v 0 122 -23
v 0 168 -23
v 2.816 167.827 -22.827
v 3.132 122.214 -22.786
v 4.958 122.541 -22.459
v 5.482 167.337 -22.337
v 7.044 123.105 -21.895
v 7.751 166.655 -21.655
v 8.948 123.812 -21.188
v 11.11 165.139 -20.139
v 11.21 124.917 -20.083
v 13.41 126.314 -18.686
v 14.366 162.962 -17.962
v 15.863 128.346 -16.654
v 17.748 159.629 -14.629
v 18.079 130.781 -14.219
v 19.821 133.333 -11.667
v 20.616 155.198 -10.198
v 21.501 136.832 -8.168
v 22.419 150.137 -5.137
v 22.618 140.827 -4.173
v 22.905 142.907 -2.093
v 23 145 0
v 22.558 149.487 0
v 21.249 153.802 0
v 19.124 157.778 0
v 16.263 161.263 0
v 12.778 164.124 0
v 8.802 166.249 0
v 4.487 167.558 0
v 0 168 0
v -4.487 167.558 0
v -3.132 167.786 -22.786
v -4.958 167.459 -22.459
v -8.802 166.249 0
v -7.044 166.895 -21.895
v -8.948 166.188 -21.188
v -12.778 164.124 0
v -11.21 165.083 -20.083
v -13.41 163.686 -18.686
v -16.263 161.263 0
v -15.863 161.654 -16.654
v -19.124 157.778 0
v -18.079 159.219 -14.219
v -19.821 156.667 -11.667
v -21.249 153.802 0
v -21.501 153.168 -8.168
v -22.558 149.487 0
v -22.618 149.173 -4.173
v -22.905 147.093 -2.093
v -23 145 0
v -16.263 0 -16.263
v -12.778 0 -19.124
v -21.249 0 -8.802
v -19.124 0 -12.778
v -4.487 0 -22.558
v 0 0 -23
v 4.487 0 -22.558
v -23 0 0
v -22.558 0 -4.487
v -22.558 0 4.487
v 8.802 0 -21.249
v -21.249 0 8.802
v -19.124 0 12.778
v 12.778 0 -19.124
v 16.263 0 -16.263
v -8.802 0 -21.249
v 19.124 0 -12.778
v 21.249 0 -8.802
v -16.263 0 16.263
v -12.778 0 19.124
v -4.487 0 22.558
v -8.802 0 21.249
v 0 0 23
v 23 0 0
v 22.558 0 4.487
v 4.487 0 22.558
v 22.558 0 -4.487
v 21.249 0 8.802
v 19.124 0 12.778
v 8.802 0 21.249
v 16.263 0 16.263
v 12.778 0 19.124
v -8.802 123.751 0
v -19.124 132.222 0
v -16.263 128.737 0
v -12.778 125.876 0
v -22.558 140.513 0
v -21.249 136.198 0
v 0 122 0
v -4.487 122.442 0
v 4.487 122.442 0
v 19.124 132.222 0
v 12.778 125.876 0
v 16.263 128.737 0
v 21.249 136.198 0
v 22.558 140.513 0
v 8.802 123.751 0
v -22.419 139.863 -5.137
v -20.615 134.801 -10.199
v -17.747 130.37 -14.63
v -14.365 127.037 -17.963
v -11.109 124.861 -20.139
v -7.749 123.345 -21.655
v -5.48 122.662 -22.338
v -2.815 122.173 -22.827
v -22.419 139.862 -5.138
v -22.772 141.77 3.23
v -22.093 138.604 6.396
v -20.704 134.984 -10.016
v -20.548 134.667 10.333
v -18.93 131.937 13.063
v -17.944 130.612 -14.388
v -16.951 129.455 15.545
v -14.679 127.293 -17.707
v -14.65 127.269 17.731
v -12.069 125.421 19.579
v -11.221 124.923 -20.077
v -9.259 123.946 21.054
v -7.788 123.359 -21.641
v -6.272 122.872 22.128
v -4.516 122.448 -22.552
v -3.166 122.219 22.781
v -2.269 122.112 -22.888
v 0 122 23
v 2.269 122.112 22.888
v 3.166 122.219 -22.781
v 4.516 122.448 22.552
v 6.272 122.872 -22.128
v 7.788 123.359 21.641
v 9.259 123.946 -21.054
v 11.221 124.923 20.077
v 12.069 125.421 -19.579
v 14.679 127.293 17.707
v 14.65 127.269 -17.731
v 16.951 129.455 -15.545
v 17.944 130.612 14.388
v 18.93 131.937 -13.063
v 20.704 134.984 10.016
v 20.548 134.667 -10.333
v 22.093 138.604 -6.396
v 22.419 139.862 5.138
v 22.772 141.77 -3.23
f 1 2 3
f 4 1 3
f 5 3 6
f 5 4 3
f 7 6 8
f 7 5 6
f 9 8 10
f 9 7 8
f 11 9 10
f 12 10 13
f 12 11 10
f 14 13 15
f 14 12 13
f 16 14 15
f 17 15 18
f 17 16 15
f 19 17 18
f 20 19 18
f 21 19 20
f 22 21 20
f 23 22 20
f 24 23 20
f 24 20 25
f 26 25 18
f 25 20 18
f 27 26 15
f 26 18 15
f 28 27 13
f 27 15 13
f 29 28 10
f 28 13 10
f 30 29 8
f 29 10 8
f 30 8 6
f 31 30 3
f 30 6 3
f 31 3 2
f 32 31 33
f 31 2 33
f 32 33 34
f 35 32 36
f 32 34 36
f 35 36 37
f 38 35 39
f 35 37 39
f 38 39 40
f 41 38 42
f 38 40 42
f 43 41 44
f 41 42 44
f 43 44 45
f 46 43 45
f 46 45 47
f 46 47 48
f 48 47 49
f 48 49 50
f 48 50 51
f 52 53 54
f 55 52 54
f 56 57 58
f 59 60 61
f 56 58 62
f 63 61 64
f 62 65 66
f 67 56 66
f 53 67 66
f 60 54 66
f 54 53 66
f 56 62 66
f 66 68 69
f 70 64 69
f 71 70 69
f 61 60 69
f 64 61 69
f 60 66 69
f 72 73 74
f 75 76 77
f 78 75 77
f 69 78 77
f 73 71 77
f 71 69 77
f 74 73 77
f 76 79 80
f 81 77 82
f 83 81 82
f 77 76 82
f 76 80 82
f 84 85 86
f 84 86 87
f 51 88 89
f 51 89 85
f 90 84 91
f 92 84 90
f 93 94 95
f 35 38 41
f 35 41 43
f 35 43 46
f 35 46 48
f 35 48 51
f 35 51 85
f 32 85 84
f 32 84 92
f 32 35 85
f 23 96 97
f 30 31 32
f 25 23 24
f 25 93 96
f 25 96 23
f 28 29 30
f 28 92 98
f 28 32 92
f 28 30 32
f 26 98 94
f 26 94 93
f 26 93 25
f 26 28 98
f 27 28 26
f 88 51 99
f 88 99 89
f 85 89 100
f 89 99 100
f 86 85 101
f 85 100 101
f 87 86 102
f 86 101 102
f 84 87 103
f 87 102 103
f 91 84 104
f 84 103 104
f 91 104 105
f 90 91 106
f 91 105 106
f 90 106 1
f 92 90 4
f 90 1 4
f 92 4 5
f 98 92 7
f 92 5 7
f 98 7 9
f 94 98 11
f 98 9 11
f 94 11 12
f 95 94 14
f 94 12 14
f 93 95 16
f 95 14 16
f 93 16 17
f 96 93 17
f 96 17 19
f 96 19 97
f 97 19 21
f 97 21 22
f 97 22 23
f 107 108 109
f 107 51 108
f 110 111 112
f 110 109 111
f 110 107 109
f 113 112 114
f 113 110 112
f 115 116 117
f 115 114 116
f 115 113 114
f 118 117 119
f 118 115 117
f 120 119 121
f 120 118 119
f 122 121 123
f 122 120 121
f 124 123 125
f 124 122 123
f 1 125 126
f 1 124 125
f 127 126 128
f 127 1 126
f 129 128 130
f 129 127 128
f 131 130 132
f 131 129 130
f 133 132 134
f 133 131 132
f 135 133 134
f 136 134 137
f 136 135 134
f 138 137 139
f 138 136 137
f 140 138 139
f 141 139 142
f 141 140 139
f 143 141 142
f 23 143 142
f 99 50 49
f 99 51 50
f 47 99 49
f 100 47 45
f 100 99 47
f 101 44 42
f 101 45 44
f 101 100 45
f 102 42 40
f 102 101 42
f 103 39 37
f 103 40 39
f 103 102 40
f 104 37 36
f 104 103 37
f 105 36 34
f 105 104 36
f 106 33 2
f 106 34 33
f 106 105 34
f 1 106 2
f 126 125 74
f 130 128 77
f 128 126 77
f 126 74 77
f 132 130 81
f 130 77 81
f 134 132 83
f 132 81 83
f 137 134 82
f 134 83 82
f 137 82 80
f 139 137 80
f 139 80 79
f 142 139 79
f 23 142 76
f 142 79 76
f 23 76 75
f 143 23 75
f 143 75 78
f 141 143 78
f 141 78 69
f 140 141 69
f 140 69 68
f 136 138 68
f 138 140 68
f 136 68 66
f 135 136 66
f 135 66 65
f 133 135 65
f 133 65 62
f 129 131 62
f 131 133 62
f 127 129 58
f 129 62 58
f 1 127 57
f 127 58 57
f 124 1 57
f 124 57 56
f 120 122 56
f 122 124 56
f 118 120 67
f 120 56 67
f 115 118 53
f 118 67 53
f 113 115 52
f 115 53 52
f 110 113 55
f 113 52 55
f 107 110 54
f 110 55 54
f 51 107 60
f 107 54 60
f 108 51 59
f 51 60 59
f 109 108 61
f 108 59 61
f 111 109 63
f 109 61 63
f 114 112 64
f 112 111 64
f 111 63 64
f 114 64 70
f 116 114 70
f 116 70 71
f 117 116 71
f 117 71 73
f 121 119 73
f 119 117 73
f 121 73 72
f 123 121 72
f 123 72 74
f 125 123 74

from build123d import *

# Parameters (mm, degrees)
SKETCH1_R                = 23
BOSS_EXTRUDE1_DEPTH      = 145
CUT_EXTRUDE1_DEPTH       = 149.603499286
CUT_EXTRUDE1_DEPTH_BACK  = 149.603499286
SKETCH2_4_R              = 23
BOSS_EXTRUDE3_REACH      = 150.603
BOSS_EXTRUDE3_END_RADIUS = 23
SKETCH2_R                = 23


with BuildPart() as part:
    # Sketch1 → Boss-Extrude1 (new body)
    with BuildSketch(Plane(origin=(0, 0, 0), x_dir=(1, 0, 0), z_dir=(0, 1, 0))):
        Circle(SKETCH1_R)
    extrude(amount=BOSS_EXTRUDE1_DEPTH)

    # Sketch2<4> → Cut-Extrude1 (cut, two sides: drawn at the far end of the back side and taken through both)
    with BuildSketch(Plane.XY.offset(-CUT_EXTRUDE1_DEPTH_BACK)):
        with Locations((0, 145)):
            Circle(SKETCH2_4_R)
    extrude(amount=CUT_EXTRUDE1_DEPTH + CUT_EXTRUDE1_DEPTH_BACK, mode=Mode.SUBTRACT)


with BuildPart() as body_2:
    # Boss-Extrude3: up to this cylinder (the profile starts inside it)
    boss_extrude3_end = Plane(origin=(0, 145, 0), z_dir=(0, -1, 0)) * Cylinder(BOSS_EXTRUDE3_END_RADIUS, 348.206, mode=Mode.PRIVATE)
    # Sketch2 → Boss-Extrude3 (new, up to the surface)
    with BuildSketch(Plane.XY, mode=Mode.PRIVATE) as boss_extrude3_sk1:
        with Locations((0, 145)):
            Circle(SKETCH2_R)
    boss_extrude3_tool1 = extrude(boss_extrude3_sk1.sketch, amount=-BOSS_EXTRUDE3_REACH, mode=Mode.PRIVATE) & boss_extrude3_end
    add(boss_extrude3_tool1.solids().sort_by_distance((0, 145, 0))[0])


solid = Compound([part.part, body_2.part])
